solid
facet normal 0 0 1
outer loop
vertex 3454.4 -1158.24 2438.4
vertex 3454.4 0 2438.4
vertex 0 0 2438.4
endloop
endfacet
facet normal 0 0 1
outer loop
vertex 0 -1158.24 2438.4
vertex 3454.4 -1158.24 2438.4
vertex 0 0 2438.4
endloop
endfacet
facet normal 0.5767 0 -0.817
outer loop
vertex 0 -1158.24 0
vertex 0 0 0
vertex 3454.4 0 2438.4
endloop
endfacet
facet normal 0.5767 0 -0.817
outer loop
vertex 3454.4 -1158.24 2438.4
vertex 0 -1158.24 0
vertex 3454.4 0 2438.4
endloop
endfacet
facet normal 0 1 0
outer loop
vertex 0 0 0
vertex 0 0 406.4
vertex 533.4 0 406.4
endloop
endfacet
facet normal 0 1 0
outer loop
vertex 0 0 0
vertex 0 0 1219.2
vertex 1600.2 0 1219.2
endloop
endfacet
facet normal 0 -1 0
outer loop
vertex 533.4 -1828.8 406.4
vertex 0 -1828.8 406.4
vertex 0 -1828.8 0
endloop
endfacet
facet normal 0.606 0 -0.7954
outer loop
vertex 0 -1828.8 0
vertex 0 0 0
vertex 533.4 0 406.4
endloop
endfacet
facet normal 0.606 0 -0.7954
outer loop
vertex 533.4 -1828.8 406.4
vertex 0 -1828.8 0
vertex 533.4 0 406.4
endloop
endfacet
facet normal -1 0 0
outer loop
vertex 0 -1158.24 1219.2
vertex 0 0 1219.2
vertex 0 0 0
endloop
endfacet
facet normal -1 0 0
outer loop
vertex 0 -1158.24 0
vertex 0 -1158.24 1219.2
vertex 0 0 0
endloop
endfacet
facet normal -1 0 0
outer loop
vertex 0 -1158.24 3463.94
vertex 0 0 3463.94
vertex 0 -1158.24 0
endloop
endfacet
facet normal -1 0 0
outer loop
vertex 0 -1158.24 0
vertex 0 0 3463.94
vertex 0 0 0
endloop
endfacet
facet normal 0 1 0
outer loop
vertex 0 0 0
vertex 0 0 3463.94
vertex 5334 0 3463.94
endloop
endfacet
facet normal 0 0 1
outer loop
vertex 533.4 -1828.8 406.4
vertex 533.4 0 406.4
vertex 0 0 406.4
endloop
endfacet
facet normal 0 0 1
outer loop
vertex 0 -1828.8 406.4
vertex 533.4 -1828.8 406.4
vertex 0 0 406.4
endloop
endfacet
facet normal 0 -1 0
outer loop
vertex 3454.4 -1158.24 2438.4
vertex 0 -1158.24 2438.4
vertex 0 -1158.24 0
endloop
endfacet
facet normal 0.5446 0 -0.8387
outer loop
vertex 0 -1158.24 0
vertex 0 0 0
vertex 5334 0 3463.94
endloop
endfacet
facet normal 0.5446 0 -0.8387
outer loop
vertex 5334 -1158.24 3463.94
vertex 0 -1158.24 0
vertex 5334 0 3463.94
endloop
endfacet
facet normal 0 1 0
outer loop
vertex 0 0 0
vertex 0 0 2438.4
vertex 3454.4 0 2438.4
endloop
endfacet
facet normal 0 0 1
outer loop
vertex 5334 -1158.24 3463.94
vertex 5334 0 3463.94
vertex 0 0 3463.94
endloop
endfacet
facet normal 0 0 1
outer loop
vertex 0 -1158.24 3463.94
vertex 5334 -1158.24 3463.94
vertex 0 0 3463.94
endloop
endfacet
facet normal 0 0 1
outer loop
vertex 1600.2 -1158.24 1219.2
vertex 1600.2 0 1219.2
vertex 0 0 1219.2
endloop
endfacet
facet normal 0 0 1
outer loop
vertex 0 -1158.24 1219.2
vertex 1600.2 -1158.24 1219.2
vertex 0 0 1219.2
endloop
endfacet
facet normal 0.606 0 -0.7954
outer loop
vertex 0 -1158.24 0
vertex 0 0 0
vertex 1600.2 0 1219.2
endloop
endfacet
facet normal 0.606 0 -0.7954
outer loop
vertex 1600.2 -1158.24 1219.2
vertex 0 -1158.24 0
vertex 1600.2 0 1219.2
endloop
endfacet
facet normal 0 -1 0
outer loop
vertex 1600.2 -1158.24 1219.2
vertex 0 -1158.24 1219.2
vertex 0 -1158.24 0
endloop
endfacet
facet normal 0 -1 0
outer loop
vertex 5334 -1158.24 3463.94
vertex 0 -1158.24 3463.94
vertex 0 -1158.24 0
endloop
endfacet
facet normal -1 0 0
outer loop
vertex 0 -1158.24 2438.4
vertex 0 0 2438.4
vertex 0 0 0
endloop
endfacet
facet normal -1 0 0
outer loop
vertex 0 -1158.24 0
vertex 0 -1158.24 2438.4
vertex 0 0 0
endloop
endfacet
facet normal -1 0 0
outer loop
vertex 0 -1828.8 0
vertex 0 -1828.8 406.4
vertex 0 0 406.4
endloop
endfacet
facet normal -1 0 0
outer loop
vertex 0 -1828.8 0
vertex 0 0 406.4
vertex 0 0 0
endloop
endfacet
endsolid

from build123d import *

# Parameters (mm, degrees)
F1_DEPTH = 1158.24
F3_DEPTH = 1158.24
F5_DEPTH = 1158.24
F7_DEPTH = 1828.8


with BuildPart() as f1:
    # F0 (on Front) → F1 (new body)
    with BuildSketch(Plane.XZ):
        Polygon((0, 3463.940102), (0, 0), (5334, 3463.940102), align=None)
    extrude(amount=F1_DEPTH)


with BuildPart() as f3:
    # F2 (on Front) → F3 (new body)
    with BuildSketch(Plane.XZ):
        Polygon((0, 2438.4), (0, 0), (3454.4, 2438.4), align=None)
    extrude(amount=F3_DEPTH)


with BuildPart() as f5:
    # F4 (on Front) → F5 (new body)
    with BuildSketch(Plane.XZ):
        Polygon((0, 1219.2), (0, 0), (1600.2, 1219.2), align=None)
    extrude(amount=F5_DEPTH)


with BuildPart() as f7:
    # F6 (on Front) → F7 (new body)
    with BuildSketch(Plane.XZ):
        Polygon((0, 406.4), (0, 0), (533.4, 406.4), align=None)
    extrude(amount=F7_DEPTH)


solid = Compound([f1.part, f3.part, f5.part, f7.part])
